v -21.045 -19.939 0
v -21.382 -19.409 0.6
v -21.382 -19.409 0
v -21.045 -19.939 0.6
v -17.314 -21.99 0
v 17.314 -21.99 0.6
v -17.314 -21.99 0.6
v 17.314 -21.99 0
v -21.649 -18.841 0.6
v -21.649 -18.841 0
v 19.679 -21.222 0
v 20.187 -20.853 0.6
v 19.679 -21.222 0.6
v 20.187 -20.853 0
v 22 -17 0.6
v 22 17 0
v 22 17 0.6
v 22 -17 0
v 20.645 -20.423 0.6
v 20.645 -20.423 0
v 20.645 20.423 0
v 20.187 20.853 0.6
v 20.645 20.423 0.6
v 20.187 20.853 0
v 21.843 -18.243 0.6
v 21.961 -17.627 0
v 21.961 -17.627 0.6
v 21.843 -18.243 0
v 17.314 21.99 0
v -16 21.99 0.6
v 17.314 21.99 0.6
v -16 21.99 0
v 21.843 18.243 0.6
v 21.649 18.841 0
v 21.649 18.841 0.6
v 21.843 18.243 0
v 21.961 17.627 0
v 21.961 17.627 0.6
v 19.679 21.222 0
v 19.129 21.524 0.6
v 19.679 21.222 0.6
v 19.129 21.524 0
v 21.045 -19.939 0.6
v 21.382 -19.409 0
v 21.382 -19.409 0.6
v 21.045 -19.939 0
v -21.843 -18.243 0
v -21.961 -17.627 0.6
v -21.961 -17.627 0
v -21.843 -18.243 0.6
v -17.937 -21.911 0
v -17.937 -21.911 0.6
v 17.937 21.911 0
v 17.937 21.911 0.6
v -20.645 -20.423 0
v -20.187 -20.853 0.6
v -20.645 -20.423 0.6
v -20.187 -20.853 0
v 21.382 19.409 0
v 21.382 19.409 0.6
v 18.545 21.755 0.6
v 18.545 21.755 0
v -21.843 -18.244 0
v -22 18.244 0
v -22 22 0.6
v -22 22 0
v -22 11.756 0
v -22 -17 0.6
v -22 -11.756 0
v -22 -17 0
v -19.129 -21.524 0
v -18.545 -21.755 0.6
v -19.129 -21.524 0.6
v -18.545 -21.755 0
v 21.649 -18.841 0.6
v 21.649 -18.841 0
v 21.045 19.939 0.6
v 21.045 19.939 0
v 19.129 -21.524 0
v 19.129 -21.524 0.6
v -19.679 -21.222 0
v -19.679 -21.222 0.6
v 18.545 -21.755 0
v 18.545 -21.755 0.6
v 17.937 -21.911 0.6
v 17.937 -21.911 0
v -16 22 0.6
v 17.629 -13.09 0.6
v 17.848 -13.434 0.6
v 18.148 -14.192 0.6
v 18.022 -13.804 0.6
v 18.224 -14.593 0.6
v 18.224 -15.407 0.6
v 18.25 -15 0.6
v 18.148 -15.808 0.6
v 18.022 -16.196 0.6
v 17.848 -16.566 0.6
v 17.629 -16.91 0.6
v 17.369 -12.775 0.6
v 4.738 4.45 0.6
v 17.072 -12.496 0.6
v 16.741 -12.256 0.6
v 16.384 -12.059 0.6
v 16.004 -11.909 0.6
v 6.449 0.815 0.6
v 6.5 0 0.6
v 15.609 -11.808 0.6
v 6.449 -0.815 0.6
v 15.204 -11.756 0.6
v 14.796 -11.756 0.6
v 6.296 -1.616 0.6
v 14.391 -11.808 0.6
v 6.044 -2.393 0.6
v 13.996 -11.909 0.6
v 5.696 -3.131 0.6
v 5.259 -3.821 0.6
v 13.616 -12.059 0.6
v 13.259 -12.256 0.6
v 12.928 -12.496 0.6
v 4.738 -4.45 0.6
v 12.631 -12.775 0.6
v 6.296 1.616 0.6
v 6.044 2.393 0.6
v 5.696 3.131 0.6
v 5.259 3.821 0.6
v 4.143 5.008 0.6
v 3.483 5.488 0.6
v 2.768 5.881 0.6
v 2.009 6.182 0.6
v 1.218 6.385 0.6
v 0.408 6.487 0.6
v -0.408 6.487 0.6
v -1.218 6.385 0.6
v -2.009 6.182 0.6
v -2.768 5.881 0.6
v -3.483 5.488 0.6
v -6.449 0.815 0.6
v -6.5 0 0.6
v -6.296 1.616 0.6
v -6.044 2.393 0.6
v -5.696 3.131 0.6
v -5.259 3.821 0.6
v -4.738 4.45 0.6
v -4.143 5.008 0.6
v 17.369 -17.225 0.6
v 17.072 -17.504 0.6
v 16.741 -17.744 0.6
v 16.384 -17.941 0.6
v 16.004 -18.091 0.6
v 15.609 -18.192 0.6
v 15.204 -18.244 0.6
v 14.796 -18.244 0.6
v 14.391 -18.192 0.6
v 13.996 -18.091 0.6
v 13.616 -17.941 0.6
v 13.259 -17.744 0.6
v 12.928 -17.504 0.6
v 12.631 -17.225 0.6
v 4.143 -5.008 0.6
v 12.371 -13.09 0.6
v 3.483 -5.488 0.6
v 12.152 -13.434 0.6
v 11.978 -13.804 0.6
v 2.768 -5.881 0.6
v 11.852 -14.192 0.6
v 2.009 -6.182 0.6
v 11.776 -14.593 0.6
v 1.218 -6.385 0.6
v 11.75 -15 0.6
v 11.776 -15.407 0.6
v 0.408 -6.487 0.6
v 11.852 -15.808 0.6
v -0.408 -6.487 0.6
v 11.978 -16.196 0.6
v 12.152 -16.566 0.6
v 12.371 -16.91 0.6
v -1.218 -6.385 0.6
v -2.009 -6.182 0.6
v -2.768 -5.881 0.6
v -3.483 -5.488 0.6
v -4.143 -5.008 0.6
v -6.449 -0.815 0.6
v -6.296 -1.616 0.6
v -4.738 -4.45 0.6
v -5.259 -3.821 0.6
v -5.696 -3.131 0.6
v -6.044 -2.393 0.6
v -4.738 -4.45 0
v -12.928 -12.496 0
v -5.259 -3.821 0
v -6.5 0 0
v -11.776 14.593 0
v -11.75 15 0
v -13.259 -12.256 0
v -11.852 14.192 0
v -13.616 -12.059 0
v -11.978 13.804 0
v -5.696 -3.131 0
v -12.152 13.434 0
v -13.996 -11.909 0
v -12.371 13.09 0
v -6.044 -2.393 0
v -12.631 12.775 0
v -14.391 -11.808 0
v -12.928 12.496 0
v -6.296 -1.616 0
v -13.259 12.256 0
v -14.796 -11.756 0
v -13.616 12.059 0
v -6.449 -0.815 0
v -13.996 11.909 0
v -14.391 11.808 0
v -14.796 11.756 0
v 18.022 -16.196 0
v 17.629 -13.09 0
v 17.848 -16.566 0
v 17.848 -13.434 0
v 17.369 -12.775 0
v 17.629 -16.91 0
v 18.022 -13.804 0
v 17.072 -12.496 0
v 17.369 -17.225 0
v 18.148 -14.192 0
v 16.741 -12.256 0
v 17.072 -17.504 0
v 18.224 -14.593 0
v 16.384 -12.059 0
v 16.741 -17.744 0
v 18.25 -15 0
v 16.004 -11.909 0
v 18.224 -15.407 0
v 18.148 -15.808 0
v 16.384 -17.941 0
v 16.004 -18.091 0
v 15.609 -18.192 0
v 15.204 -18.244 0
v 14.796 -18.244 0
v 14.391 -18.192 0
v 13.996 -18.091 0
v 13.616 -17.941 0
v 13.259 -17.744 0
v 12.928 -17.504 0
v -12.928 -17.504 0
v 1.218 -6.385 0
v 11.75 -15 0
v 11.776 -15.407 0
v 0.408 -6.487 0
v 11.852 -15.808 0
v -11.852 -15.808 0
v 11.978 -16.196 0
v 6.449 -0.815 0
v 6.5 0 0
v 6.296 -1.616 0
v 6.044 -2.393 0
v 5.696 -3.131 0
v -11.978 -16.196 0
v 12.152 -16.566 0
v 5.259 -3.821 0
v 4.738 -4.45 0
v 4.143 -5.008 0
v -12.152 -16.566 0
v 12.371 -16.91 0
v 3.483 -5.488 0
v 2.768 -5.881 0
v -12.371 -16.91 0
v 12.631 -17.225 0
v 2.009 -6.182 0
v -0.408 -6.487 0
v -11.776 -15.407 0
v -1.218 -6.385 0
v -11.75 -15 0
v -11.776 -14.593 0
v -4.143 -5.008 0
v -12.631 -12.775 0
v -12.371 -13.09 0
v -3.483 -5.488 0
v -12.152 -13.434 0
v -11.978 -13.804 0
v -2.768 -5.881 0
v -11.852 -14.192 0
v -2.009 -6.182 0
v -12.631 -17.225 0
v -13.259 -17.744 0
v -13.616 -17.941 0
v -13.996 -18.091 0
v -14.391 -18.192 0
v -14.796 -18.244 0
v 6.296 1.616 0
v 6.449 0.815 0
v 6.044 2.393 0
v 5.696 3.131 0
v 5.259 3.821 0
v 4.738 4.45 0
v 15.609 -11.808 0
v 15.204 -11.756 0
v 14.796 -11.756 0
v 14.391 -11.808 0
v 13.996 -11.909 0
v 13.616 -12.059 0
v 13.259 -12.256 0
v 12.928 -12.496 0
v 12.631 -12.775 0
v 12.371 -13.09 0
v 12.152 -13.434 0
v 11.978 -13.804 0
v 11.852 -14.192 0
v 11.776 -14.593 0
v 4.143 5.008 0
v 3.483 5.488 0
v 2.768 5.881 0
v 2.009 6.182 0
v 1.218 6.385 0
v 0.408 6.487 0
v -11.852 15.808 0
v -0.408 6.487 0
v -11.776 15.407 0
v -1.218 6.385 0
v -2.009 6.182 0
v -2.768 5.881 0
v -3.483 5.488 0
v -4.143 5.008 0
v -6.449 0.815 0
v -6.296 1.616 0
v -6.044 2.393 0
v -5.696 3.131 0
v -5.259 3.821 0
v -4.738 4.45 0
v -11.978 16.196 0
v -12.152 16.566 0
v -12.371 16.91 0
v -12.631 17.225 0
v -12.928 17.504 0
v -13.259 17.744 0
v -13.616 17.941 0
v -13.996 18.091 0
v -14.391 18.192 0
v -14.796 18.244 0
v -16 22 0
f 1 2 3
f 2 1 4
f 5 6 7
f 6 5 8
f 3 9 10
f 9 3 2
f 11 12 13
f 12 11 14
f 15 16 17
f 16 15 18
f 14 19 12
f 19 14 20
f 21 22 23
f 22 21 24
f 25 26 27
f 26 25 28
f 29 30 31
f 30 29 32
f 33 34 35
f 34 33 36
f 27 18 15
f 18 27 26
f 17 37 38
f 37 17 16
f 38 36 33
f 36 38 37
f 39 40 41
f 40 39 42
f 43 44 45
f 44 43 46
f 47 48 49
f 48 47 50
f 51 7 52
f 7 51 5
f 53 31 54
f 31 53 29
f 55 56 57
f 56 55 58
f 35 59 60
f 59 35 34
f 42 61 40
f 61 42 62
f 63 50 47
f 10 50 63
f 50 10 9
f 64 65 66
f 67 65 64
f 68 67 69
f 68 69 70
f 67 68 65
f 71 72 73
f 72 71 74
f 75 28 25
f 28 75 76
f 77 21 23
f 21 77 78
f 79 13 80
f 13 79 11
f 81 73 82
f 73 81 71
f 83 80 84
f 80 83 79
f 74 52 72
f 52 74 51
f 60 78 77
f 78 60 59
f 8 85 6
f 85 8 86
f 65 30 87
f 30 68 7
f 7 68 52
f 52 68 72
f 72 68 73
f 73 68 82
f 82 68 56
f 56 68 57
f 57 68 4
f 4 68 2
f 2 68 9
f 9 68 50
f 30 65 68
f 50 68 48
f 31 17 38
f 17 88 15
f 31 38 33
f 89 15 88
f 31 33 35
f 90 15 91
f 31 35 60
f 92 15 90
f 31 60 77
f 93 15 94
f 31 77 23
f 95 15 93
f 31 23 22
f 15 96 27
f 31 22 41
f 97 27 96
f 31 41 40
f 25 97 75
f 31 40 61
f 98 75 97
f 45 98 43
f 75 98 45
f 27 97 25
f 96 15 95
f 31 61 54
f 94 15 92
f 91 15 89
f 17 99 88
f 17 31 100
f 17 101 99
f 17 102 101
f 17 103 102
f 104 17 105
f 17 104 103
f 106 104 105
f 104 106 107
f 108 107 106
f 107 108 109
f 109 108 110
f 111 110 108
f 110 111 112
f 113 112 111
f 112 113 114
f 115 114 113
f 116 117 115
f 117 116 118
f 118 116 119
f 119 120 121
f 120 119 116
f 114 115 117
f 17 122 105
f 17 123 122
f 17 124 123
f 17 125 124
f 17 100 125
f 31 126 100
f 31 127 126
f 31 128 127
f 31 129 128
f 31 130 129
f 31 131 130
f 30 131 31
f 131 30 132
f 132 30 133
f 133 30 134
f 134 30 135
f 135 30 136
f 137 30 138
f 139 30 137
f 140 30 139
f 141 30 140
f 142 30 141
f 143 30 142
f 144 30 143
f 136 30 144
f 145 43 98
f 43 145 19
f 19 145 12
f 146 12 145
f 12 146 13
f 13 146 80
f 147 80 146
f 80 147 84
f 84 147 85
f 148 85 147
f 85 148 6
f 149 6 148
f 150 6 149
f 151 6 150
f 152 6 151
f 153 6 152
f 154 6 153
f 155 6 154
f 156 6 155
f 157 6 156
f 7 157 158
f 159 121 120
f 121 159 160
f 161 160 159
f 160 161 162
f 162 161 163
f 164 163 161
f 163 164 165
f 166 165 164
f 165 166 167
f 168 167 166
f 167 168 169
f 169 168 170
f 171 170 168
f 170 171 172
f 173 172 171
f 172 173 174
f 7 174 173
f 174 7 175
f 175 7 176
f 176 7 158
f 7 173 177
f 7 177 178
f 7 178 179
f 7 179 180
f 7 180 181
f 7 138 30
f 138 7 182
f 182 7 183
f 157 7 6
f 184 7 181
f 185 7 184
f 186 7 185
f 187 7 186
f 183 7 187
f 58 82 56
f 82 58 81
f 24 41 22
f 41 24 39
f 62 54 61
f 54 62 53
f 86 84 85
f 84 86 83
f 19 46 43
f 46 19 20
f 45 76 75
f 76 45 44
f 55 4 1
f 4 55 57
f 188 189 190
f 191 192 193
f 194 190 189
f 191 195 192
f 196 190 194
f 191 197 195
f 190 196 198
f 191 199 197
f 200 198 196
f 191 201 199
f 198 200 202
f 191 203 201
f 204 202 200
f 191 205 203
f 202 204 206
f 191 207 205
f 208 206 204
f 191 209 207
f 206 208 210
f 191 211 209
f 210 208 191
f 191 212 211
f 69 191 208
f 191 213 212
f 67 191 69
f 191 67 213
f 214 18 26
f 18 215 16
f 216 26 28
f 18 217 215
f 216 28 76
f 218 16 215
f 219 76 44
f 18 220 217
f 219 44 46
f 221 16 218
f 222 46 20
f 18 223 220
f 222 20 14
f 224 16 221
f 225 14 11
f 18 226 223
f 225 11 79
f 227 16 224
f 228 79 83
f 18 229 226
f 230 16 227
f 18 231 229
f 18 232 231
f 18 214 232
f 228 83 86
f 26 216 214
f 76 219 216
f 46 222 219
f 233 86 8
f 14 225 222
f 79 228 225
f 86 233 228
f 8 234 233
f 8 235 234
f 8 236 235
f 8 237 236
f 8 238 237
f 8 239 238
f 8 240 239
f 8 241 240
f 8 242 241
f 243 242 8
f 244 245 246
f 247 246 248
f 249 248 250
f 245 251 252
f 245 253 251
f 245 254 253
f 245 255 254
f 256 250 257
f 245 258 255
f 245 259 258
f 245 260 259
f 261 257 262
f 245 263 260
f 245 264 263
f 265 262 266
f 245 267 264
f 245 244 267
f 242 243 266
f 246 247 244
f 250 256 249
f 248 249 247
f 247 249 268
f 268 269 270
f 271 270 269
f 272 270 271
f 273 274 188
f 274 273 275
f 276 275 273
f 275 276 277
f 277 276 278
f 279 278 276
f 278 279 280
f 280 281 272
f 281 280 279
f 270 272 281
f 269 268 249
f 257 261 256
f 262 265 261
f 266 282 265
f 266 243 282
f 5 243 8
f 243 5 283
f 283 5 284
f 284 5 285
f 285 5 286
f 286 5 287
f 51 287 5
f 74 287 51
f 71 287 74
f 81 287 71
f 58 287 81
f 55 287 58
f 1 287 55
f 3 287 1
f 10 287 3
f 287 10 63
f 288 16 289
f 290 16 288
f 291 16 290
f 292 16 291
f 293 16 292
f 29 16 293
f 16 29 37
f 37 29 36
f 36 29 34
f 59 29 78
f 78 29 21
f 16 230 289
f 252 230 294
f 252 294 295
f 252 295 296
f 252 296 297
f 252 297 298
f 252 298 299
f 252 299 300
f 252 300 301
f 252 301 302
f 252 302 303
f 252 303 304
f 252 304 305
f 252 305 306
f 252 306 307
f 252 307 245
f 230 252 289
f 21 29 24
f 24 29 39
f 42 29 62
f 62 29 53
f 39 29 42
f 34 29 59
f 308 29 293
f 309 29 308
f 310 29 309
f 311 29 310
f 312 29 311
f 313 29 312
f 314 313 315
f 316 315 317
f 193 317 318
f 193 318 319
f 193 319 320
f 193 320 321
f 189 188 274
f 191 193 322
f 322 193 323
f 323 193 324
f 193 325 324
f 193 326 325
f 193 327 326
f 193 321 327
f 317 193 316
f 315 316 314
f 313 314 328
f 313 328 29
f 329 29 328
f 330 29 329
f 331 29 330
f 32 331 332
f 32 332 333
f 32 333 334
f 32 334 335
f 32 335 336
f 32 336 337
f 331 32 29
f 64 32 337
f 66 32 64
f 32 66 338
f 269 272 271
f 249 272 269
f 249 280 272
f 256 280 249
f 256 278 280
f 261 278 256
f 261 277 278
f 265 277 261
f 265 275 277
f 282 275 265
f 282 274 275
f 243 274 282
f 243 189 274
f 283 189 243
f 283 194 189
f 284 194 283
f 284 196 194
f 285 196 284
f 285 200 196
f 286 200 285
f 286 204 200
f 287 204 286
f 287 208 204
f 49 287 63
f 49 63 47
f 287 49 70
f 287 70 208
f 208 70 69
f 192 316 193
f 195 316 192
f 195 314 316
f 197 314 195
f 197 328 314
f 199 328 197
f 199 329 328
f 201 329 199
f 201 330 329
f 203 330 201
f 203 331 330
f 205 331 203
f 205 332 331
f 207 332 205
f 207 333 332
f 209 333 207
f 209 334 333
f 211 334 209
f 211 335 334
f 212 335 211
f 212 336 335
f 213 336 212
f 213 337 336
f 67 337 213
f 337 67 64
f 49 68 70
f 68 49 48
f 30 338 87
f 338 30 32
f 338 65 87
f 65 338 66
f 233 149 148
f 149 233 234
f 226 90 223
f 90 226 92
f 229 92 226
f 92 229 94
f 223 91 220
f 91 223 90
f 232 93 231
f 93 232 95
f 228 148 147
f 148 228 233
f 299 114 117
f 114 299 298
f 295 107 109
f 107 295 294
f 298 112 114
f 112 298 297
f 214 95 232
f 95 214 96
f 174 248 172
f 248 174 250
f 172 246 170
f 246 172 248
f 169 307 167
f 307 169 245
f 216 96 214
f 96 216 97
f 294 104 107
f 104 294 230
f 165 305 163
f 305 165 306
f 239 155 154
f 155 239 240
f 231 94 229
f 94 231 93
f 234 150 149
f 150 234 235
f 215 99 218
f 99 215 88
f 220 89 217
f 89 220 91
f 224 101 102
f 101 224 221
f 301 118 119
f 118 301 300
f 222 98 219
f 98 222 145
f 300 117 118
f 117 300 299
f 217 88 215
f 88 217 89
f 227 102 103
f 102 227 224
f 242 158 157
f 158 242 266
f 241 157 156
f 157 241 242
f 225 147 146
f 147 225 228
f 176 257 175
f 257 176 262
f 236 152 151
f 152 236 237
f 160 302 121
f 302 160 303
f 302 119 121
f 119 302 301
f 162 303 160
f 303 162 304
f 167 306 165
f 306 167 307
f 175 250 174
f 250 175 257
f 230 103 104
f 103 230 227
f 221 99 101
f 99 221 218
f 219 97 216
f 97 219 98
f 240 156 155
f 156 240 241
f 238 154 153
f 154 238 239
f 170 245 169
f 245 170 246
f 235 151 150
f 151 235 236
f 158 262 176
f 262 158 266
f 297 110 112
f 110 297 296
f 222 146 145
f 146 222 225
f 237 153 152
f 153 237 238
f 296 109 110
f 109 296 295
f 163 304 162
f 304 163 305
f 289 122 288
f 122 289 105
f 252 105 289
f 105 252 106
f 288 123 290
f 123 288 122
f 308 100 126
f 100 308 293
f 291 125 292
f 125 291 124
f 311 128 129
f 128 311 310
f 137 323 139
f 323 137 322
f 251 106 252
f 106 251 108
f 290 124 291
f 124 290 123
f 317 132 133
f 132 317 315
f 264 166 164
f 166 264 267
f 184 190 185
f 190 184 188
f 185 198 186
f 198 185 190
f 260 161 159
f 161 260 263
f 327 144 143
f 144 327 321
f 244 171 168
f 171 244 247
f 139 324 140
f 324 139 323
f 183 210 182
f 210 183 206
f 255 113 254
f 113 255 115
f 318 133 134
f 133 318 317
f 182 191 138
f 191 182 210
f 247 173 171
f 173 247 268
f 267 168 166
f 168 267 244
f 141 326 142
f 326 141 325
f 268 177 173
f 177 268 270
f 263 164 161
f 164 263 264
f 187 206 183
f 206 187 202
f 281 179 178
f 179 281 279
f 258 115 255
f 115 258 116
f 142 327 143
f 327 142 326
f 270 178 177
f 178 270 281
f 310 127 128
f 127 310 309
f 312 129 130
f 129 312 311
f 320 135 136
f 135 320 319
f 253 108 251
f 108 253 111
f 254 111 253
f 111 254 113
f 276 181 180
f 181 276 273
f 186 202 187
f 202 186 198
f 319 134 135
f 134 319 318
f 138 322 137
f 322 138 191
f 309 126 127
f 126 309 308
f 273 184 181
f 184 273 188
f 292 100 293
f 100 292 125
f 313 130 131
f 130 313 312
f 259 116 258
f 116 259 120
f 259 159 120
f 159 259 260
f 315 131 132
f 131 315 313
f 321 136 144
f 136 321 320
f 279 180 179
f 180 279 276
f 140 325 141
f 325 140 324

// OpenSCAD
$fn = 50;


difference() {
	union() {
		hull() {
			translate(v = [-17.0000000000, 17.0000000000, 0]) {
				cylinder(h = 0.6000000000, r = 5);
			}
			translate(v = [17.0000000000, 17.0000000000, 0]) {
				cylinder(h = 0.6000000000, r = 5);
			}
			translate(v = [-17.0000000000, -17.0000000000, 0]) {
				cylinder(h = 0.6000000000, r = 5);
			}
			translate(v = [17.0000000000, -17.0000000000, 0]) {
				cylinder(h = 0.6000000000, r = 5);
			}
		}
		translate(v = [-22.0000000000, 16.0000000000, 0]) {
			cube(size = [6, 6, 0.6000000000]);
		}
	}
	union() {
		translate(v = [-22.5000000000, -15.0000000000, -250.0000000000]) {
			rotate(a = [0, 0, 0]) {
				difference() {
					union() {
						hull() {
							translate(v = [7.5000000000, 0, 0]) {
								cylinder(h = 250, r = 3.2500000000, r1 = 3.2500000000, r2 = 3.2500000000);
							}
							translate(v = [-7.5000000000, 0, 0]) {
								cylinder(h = 250, r = 3.2500000000, r1 = 3.2500000000, r2 = 3.2500000000);
							}
						}
					}
					union();
				}
			}
		}
		translate(v = [-22.5000000000, 15.0000000000, -250.0000000000]) {
			rotate(a = [0, 0, 0]) {
				difference() {
					union() {
						hull() {
							translate(v = [7.5000000000, 0, 0]) {
								cylinder(h = 250, r = 3.2500000000, r1 = 3.2500000000, r2 = 3.2500000000);
							}
							translate(v = [-7.5000000000, 0, 0]) {
								cylinder(h = 250, r = 3.2500000000, r1 = 3.2500000000, r2 = 3.2500000000);
							}
						}
					}
					union();
				}
			}
		}
		translate(v = [15.0000000000, -15.0000000000, -50.0000000000]) {
			cylinder(h = 100, r = 3.2500000000);
		}
		cylinder(h = 0.6000000000, r = 6.5000000000);
	}
}
